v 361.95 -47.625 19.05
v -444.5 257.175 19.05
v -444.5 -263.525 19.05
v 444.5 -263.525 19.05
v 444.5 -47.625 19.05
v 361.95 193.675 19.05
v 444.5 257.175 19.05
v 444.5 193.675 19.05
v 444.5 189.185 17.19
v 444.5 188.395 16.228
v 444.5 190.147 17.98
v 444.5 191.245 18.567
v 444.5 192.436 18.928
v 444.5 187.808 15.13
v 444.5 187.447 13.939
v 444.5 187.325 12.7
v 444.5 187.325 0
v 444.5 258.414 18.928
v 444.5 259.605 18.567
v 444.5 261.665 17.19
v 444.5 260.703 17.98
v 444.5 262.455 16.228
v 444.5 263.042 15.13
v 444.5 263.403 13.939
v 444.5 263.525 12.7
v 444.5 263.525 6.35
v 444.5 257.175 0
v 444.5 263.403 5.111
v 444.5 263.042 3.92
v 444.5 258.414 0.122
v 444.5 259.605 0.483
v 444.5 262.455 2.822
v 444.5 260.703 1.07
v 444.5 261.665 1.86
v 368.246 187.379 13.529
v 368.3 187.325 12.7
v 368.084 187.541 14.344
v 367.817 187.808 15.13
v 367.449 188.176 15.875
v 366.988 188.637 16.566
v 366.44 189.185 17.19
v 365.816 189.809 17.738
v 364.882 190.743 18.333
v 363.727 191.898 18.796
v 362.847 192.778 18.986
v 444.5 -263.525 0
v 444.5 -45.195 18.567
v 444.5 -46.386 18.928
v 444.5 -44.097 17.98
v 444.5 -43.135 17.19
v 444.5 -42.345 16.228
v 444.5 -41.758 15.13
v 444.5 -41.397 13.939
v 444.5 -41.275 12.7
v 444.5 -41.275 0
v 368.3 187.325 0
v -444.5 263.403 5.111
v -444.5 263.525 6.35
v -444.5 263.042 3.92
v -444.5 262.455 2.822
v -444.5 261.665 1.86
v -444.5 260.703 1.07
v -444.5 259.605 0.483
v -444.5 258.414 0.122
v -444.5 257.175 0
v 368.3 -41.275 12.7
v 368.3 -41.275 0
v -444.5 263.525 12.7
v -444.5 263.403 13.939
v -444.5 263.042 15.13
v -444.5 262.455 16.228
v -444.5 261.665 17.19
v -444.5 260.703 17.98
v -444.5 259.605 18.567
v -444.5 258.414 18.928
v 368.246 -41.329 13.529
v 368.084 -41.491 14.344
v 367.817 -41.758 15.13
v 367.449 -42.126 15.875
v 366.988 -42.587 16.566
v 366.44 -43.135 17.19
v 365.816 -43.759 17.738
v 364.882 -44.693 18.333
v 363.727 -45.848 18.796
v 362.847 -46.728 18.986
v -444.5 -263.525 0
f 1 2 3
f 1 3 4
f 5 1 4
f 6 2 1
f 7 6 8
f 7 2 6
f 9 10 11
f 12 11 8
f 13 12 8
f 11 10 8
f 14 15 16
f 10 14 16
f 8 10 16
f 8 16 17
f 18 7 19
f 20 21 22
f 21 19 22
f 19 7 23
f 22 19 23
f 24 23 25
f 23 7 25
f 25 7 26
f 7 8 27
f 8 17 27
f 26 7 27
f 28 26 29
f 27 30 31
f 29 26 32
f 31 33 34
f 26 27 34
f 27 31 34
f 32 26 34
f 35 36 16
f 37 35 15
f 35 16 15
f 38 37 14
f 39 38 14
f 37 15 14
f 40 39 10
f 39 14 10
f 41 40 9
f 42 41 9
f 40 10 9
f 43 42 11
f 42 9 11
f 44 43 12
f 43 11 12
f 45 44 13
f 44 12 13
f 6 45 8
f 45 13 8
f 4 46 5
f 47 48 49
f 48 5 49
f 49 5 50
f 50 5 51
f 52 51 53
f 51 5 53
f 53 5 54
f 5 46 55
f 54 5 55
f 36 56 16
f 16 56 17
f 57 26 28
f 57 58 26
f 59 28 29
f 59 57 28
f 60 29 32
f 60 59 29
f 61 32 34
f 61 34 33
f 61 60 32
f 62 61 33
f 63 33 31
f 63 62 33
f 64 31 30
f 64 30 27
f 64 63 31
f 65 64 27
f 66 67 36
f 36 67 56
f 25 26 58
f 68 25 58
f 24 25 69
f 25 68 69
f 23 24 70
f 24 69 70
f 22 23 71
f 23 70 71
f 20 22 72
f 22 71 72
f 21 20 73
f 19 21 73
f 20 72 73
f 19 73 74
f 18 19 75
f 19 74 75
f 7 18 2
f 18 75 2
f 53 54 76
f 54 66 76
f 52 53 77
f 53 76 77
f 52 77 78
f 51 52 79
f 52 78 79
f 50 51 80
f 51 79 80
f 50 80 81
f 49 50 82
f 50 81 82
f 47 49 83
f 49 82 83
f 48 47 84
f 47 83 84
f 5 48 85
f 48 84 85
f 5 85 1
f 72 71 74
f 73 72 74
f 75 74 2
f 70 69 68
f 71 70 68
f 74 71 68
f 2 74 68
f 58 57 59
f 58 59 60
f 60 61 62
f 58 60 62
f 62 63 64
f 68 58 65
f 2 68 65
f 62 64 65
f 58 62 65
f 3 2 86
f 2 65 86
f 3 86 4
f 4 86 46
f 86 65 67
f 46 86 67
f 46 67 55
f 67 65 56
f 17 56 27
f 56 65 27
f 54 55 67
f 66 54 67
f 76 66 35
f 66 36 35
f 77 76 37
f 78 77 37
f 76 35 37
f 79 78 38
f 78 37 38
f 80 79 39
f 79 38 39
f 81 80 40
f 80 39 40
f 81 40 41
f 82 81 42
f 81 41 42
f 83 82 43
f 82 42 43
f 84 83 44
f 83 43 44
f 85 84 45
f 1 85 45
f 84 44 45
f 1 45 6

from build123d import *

# Parameters (mm, degrees)
F1_DEPTH = 19.05
F2_R     = 6.35


with BuildPart() as f1:
    # F0 (on Top) → F1 (new body)
    with BuildSketch(Plane.XY):
        Polygon((-444.5, -263.525), (444.5, -263.525), (444.5, -41.275), (368.3, -41.275), (368.3, 187.325), (444.5, 187.325), (444.5, 263.525), (-444.5, 263.525), align=None)
    extrude(amount=F1_DEPTH)

    # F2
    f2_edges = [f1.edges().sort_by_distance(p)[0] for p in [
        (0, 263.525, 19.05),
        (0, 263.525, 0),
        (406.4, -41.275, 19.05),
        (368.3, 73.025, 19.05),
        (406.4, 187.325, 19.05),
    ]]
    fillet(f2_edges, radius=F2_R)


solid = f1.part
